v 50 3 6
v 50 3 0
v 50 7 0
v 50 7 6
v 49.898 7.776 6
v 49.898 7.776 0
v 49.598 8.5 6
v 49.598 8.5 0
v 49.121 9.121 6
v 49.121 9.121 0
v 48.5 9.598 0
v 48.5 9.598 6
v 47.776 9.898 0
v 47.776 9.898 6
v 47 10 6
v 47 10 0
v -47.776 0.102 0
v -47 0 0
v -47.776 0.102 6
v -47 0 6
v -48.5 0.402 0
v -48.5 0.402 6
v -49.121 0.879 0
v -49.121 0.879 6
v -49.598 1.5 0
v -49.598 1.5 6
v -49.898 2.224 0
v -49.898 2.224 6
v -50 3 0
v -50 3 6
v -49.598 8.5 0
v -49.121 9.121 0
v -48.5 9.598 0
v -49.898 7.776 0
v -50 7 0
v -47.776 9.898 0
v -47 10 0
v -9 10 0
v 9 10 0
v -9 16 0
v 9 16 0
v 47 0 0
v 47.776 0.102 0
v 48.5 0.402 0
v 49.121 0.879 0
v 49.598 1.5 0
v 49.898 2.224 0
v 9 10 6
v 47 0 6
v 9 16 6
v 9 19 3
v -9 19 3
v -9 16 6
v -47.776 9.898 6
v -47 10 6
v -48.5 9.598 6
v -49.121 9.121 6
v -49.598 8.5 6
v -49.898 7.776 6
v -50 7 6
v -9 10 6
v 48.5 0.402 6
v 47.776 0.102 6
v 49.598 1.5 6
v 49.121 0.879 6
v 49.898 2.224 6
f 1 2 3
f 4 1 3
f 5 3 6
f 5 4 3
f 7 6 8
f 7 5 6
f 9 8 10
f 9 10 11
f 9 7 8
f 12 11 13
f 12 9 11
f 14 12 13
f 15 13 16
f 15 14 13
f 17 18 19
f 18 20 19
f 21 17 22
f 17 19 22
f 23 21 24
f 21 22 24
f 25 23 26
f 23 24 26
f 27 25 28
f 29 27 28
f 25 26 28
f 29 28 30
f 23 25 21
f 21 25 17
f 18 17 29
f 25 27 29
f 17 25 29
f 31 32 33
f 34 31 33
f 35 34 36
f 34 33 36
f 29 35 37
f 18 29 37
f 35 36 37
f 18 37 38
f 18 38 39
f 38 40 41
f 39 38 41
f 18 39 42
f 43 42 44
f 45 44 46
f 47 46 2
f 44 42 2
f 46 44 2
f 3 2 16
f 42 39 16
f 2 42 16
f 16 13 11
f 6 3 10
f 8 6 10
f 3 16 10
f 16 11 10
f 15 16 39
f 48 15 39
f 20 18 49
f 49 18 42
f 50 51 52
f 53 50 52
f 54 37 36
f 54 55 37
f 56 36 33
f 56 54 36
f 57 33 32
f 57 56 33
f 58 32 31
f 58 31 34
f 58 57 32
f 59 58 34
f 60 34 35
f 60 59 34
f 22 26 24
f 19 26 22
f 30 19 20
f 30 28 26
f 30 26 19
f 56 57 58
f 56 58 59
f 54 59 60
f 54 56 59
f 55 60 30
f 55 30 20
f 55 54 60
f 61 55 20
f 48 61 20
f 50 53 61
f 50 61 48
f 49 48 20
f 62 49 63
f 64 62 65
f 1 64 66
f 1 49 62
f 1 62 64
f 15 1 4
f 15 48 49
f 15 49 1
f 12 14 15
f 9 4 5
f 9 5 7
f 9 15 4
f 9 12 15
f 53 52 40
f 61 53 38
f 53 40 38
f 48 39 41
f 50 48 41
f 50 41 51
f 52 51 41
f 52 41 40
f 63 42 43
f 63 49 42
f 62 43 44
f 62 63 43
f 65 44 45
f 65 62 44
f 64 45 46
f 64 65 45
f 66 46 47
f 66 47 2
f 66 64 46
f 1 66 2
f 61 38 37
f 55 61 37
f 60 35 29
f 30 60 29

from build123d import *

# Parameters (mm, degrees)
EXTRUDE_1_DEPTH = 6
FILLET_1_R      = 3
CHAMFER_1_SIZE  = 3


with BuildPart() as part:
    # 草图1 → 凸台-拉伸1 (new body)
    with BuildSketch(Plane.XY):
        Polygon((-50, 0), (50, 0), (50, 10), (9, 10), (9, 19), (-9, 19), (-9, 10), (-50, 10), align=None)
    extrude(amount=EXTRUDE_1_DEPTH)

    # 圆角1
    fillet_1_edges = [part.edges().sort_by_distance(p)[0] for p in [
        (50, 10, 3),
        (50, 0, 3),
        (-50, 0, 3),
        (-50, 10, 3),
    ]]
    fillet(fillet_1_edges, radius=FILLET_1_R)

    # 倒角1
    chamfer_1_edges = [part.edges().sort_by_distance(p)[0] for p in [
        (0, 19, 6),
        (0, 19, 0),
    ]]
    chamfer(chamfer_1_edges, length=CHAMFER_1_SIZE - 0.0001)  # a hair under: the kernel refuses the full size


solid = part.part
